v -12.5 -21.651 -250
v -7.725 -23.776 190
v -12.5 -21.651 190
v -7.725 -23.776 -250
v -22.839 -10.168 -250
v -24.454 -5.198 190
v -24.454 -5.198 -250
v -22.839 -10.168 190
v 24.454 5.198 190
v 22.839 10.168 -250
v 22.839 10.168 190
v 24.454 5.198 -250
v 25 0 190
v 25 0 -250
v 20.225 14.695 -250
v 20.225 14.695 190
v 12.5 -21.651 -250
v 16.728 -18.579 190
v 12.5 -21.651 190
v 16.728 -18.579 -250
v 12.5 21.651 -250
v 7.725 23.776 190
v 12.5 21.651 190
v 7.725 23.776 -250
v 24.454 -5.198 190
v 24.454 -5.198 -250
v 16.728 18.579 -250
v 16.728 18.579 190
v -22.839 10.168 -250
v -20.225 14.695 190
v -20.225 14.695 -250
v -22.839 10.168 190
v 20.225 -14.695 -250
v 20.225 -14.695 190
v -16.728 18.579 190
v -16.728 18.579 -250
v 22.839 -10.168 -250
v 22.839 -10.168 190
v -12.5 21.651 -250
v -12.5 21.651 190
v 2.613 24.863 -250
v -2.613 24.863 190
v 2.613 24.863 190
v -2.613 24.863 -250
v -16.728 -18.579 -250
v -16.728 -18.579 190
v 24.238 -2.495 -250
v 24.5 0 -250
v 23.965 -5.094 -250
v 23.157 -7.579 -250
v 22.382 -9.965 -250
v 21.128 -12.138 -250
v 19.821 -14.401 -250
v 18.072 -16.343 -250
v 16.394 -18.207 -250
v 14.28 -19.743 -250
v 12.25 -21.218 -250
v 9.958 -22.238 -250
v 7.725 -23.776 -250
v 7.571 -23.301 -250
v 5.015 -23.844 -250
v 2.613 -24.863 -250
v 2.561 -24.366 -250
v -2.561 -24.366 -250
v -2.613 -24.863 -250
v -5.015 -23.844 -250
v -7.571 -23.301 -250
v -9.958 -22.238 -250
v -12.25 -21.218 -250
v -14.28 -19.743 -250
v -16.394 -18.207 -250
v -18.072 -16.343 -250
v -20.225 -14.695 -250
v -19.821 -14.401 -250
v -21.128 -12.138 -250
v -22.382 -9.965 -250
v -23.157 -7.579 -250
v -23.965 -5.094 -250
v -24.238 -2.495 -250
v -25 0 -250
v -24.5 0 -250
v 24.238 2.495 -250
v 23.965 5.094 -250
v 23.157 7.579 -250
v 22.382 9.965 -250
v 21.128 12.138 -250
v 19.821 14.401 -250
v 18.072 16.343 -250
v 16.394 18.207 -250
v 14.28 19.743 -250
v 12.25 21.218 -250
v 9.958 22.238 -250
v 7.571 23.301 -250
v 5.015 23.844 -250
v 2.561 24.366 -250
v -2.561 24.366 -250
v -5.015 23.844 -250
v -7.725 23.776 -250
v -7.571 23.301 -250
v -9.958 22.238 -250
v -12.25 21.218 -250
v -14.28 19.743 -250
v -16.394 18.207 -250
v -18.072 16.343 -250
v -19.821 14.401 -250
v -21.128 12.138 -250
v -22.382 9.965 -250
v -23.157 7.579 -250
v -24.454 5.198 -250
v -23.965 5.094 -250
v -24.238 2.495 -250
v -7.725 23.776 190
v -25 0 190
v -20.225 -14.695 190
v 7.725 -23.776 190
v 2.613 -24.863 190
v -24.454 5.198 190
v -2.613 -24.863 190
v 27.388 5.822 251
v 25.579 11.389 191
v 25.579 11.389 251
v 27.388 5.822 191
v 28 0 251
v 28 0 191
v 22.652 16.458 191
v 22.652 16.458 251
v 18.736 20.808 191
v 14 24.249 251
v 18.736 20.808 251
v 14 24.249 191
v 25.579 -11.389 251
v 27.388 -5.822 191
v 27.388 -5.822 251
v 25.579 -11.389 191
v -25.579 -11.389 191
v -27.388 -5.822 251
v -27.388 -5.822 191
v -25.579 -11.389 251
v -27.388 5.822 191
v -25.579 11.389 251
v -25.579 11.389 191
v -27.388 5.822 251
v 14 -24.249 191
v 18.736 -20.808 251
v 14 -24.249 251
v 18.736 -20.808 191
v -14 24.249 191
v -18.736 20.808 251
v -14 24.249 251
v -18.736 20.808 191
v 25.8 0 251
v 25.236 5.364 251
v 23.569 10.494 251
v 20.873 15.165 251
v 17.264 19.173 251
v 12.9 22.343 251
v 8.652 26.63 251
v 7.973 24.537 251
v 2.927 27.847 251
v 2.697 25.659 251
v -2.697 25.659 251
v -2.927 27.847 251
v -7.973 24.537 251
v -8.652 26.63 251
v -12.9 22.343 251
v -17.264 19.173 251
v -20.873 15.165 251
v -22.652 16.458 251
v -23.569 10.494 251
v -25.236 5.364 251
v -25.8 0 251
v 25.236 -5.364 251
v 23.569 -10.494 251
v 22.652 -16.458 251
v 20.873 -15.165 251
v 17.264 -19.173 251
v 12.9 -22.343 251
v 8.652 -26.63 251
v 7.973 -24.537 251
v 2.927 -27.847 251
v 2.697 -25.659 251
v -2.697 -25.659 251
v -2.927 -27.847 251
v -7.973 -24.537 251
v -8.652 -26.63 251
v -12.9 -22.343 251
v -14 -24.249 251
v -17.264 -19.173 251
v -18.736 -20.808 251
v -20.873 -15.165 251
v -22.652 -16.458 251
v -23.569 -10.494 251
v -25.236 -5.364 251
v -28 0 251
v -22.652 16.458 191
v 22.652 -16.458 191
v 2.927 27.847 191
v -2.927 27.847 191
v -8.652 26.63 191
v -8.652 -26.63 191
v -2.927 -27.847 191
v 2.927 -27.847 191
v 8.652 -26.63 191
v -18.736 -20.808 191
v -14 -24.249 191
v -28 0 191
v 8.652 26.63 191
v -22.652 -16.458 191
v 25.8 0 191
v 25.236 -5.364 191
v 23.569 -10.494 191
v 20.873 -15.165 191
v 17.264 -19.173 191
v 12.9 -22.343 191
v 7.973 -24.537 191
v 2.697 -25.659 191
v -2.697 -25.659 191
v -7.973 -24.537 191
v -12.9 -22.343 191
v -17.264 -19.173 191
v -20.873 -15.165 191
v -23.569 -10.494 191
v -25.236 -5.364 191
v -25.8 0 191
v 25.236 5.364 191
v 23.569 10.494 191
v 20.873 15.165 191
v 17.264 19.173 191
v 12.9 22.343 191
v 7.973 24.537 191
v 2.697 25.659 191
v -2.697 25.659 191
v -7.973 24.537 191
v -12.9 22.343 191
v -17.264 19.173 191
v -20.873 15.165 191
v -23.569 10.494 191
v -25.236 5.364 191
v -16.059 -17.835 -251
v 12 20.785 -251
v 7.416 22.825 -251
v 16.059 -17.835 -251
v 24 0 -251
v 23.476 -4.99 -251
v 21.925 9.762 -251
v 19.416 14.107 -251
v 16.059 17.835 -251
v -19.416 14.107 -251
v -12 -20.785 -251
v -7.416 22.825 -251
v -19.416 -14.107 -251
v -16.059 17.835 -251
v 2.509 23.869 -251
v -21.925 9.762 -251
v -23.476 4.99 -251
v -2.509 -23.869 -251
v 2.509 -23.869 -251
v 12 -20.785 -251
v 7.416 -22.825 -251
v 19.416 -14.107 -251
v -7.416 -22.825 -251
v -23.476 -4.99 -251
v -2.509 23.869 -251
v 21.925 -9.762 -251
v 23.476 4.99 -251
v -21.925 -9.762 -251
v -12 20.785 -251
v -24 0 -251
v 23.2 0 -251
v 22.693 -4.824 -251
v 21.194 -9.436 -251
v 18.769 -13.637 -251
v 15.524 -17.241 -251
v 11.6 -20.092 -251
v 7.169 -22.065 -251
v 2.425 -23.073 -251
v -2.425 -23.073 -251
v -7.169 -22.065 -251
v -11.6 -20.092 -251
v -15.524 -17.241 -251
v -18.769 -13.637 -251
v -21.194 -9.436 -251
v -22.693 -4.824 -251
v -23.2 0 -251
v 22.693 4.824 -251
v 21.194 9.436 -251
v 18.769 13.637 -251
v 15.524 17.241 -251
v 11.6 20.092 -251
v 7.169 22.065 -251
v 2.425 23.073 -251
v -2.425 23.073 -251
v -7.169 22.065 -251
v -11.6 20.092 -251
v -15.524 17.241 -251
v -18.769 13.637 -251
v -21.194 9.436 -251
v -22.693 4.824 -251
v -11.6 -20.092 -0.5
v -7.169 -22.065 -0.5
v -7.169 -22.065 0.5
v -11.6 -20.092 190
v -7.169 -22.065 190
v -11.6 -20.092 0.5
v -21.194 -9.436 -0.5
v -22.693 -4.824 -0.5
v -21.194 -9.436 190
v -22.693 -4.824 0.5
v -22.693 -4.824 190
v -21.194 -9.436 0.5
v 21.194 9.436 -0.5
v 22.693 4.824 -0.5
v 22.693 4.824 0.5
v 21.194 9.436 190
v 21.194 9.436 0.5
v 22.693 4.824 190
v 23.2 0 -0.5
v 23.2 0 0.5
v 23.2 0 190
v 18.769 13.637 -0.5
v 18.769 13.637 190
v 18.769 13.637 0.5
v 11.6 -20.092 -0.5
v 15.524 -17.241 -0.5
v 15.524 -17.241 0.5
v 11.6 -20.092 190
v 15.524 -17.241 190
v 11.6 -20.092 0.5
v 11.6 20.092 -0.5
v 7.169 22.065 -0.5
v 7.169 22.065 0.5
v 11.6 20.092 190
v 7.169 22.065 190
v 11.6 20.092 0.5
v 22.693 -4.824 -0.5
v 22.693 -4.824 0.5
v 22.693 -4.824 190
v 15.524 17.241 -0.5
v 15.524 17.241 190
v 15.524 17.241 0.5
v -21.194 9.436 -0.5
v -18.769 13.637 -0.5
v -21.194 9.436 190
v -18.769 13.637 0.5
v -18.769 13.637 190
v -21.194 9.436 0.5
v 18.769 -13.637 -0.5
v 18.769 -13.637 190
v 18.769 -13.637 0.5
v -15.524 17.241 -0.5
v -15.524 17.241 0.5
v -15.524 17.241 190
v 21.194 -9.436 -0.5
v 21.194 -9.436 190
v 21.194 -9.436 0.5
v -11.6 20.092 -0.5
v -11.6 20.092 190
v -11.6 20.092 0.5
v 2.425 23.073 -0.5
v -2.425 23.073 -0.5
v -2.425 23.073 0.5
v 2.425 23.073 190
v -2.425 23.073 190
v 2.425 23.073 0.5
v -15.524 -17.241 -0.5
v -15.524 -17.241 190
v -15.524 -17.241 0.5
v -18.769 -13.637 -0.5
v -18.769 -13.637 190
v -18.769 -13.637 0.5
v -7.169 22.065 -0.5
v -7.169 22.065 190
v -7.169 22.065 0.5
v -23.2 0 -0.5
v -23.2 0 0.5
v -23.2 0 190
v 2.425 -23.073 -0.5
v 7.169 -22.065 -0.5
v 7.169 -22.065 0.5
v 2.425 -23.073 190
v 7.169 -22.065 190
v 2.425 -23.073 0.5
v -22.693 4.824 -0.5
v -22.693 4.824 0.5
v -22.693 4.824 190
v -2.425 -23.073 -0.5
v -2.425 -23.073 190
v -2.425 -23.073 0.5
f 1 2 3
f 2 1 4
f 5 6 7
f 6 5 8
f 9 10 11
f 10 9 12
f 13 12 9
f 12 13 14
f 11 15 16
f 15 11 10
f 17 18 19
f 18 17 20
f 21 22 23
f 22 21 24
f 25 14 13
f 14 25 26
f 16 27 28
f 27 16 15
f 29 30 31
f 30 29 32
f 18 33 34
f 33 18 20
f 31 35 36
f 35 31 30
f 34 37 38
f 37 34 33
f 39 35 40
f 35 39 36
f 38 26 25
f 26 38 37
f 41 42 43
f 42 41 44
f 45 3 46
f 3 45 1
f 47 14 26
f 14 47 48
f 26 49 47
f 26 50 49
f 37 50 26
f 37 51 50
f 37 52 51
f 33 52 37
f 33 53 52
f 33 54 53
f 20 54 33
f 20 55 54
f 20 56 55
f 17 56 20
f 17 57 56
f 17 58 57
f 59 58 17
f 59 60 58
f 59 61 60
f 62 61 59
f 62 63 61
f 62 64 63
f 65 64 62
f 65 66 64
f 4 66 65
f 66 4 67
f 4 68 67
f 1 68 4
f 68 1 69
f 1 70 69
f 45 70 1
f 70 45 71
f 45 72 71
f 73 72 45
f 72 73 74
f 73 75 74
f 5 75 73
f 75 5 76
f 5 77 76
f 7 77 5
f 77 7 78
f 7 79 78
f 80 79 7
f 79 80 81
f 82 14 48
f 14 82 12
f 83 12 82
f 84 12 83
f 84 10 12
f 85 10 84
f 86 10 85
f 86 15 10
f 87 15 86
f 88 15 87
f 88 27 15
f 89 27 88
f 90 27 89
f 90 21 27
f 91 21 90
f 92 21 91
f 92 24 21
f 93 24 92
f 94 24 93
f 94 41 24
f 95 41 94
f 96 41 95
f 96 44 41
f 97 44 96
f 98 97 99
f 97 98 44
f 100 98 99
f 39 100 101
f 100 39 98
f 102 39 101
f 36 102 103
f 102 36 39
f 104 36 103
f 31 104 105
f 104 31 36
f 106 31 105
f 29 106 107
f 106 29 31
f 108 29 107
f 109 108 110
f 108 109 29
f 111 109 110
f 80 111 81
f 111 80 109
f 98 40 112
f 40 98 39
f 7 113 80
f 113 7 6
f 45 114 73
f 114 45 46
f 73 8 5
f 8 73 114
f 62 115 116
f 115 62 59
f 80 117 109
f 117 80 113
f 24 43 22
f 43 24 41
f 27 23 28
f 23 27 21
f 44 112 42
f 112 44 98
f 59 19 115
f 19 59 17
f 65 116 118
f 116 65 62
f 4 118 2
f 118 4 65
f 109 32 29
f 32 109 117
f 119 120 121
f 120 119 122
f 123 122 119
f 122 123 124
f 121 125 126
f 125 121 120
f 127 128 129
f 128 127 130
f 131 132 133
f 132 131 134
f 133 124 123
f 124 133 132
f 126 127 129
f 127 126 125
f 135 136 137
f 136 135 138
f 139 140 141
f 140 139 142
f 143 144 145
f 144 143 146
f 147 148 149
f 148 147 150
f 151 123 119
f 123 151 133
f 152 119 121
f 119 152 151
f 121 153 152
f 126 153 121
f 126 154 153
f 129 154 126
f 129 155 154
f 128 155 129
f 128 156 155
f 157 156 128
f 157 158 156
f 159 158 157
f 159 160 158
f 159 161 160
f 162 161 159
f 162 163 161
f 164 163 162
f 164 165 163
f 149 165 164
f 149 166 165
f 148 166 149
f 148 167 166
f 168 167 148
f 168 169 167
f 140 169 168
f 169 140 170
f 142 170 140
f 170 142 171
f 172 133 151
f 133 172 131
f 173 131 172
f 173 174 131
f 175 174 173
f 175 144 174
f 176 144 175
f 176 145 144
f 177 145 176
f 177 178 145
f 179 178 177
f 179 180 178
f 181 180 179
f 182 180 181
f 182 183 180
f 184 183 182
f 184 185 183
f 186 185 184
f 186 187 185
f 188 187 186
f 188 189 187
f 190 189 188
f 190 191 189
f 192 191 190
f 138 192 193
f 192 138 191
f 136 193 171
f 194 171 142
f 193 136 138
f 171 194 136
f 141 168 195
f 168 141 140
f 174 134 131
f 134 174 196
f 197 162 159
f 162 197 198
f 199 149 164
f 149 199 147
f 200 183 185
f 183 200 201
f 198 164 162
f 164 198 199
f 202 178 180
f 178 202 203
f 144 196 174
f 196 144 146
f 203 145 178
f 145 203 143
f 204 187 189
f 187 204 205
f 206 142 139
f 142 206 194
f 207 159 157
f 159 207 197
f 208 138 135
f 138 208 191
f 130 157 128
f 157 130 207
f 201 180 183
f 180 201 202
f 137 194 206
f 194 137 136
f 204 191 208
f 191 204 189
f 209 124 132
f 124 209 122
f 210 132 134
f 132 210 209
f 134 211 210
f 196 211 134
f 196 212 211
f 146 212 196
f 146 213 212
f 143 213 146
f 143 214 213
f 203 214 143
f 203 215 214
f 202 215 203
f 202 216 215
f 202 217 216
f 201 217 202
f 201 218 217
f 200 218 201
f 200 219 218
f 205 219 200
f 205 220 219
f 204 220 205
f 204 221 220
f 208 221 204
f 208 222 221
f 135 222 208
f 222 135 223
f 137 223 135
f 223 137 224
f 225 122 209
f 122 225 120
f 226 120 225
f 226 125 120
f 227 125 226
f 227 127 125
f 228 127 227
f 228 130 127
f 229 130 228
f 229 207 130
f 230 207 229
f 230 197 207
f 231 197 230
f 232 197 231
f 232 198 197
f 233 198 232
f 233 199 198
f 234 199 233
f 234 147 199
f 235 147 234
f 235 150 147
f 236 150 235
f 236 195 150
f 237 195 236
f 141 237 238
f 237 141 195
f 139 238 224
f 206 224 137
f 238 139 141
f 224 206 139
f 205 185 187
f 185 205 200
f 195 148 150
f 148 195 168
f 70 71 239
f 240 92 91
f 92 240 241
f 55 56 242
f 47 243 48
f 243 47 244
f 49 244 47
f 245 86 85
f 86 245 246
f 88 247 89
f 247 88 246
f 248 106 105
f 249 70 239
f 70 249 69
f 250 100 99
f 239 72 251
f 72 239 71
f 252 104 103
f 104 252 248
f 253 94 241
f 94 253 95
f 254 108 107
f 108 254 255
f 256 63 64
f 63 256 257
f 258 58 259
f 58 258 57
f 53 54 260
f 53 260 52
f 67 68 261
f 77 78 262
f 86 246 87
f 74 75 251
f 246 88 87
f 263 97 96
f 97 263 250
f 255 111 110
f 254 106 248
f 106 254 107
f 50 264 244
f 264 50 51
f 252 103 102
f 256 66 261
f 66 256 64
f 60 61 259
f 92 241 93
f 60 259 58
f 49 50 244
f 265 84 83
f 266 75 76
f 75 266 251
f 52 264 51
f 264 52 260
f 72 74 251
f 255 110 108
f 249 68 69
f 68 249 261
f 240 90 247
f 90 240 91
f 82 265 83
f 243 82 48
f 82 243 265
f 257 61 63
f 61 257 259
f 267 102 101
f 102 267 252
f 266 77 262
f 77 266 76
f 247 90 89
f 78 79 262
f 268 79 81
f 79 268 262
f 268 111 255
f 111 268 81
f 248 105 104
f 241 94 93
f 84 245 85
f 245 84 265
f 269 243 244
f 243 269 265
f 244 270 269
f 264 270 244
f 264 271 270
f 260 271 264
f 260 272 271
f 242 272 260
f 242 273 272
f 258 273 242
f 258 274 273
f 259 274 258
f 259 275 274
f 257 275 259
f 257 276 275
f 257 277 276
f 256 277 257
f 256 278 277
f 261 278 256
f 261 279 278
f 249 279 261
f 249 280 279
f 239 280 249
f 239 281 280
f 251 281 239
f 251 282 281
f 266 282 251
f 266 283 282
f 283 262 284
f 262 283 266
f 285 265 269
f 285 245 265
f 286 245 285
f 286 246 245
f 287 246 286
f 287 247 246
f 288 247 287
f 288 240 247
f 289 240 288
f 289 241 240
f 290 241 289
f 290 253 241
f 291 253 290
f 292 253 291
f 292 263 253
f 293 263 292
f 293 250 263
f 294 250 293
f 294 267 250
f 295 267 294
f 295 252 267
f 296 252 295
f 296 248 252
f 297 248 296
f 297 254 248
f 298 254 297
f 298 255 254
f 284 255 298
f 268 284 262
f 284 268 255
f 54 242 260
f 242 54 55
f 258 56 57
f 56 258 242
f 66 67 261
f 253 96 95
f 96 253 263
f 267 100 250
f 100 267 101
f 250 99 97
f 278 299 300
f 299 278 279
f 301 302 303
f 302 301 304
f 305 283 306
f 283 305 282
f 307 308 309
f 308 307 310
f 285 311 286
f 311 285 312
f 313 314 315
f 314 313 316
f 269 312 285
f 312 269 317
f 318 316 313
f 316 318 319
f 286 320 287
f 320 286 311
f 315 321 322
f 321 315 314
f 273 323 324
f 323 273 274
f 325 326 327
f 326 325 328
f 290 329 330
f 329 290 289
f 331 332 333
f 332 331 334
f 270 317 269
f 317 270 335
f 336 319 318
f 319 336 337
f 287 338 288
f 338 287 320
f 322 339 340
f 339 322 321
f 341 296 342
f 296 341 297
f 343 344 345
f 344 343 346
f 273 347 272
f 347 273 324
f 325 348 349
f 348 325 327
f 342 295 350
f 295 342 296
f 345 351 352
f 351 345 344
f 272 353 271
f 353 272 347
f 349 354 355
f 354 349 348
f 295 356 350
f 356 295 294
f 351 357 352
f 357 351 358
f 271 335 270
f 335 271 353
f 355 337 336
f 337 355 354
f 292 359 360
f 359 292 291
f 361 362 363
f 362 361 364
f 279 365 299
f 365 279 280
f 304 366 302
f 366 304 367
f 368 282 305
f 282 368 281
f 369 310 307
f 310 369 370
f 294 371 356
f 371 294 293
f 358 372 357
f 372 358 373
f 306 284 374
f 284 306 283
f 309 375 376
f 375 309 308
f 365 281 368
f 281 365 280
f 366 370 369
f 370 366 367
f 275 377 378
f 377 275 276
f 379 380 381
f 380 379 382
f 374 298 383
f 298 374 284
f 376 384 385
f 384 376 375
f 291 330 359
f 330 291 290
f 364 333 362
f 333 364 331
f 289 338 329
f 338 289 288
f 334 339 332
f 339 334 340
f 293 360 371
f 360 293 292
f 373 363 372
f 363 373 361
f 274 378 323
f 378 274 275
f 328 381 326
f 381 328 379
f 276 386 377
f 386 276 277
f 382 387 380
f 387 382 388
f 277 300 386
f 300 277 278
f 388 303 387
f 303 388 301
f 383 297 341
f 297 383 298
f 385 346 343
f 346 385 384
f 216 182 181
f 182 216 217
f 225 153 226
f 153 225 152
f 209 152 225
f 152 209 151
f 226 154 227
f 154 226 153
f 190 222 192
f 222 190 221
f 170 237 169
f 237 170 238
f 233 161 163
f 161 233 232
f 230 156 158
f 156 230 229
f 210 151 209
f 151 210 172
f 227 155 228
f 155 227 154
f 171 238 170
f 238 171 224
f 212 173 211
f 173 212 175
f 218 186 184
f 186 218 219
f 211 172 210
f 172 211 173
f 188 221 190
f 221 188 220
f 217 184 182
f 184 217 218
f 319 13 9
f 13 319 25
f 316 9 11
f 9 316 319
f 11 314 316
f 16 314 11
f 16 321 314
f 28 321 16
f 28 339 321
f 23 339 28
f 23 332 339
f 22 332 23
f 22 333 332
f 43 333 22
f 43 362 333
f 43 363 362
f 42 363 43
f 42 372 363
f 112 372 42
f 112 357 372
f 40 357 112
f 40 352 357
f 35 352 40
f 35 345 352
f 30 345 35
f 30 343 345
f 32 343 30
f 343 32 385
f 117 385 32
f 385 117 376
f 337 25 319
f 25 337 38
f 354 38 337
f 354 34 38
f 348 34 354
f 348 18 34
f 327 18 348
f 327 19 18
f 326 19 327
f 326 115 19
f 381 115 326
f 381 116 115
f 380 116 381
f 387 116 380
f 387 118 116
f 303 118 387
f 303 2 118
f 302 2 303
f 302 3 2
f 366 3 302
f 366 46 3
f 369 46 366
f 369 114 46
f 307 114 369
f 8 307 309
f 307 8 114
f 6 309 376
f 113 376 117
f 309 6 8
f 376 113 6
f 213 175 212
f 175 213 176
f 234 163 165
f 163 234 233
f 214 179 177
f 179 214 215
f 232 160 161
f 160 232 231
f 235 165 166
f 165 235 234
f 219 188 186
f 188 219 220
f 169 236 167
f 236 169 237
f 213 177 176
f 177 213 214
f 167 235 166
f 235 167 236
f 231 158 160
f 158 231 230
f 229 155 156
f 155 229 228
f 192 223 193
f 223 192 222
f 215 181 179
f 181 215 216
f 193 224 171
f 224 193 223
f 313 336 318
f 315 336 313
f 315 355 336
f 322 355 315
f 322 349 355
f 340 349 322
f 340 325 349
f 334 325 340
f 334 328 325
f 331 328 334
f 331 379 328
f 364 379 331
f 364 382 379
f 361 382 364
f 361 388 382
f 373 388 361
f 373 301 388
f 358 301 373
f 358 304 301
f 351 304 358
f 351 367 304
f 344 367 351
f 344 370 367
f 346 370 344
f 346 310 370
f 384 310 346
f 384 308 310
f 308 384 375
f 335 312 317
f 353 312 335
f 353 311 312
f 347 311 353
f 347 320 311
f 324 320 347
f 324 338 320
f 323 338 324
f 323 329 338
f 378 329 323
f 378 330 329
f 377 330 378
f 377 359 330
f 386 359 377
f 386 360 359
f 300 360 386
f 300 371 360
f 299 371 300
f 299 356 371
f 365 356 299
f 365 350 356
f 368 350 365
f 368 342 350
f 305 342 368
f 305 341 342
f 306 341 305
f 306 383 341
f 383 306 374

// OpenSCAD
// Parameters
pipe_length = 500; //[250:1000:1]
outer_diameter = 50; //[25:100:1]
wall_thickness = 1.8; //[0.9:3.6:0.1]
socket_length = 60; //[30:120:1]
socket_outer_diameter = 56; //[50:80:1]
socket_wall_thickness = 2.2; //[1.1:4.4:0.1]
chamfer_length = 2; //[1:6:0.5]
chamfer_radial = 1; //[0.5:3:0.5]
overlap = 1; //[0.5:2:0.5]

// Base Shapes
module pipe_body() {
  cylinder(h=pipe_length, r=outer_diameter/2, center=true);
}

module inner_bore() {
  cylinder(h=pipe_length + 2*overlap, r=outer_diameter/2 - wall_thickness, center=true);
}

module socket_end() {
  translate([0, 0, pipe_length/2 - socket_length/2 + overlap])
    cylinder(h=socket_length, r=socket_outer_diameter/2, center=true);
}

module socket_inner_bore() {
  translate([0, 0, pipe_length/2 - socket_length/2 + overlap])
    cylinder(h=socket_length + 2*overlap, r=socket_outer_diameter/2 - socket_wall_thickness, center=true);
}

module chamfer_socket_outer() {
  translate([0, 0, pipe_length/2 - chamfer_length/2 + overlap])
    cylinder(h=chamfer_length, r1=socket_outer_diameter/2, r2=socket_outer_diameter/2 - chamfer_radial, center=true);
}

module chamfer_plain_outer() {
  translate([0, 0, -pipe_length/2 + chamfer_length/2 - overlap])
    rotate([180, 0, 0])
    cylinder(h=chamfer_length, r1=outer_diameter/2, r2=outer_diameter/2 - chamfer_radial, center=true);
}

module markings() {
  cylinder(h=overlap, r=outer_diameter/2, center=true);
}

// Operations
module outer_with_socket() {
  union() {
    pipe_body();
    socket_end();
  }
}

module outer_with_socket_and_chamfers() {
  union() {
    outer_with_socket();
    chamfer_socket_outer();
    chamfer_plain_outer();
  }
}

module pipe_hollowed() {
  difference() {
    outer_with_socket_and_chamfers();
    inner_bore();
    socket_inner_bore();
  }
}

module final_model() {
  union() {
    pipe_hollowed();
    markings();
  }
}

// Final Output
color([0.85, 0.85, 0.8]) // Off-white for PVC pipe
final_model();
